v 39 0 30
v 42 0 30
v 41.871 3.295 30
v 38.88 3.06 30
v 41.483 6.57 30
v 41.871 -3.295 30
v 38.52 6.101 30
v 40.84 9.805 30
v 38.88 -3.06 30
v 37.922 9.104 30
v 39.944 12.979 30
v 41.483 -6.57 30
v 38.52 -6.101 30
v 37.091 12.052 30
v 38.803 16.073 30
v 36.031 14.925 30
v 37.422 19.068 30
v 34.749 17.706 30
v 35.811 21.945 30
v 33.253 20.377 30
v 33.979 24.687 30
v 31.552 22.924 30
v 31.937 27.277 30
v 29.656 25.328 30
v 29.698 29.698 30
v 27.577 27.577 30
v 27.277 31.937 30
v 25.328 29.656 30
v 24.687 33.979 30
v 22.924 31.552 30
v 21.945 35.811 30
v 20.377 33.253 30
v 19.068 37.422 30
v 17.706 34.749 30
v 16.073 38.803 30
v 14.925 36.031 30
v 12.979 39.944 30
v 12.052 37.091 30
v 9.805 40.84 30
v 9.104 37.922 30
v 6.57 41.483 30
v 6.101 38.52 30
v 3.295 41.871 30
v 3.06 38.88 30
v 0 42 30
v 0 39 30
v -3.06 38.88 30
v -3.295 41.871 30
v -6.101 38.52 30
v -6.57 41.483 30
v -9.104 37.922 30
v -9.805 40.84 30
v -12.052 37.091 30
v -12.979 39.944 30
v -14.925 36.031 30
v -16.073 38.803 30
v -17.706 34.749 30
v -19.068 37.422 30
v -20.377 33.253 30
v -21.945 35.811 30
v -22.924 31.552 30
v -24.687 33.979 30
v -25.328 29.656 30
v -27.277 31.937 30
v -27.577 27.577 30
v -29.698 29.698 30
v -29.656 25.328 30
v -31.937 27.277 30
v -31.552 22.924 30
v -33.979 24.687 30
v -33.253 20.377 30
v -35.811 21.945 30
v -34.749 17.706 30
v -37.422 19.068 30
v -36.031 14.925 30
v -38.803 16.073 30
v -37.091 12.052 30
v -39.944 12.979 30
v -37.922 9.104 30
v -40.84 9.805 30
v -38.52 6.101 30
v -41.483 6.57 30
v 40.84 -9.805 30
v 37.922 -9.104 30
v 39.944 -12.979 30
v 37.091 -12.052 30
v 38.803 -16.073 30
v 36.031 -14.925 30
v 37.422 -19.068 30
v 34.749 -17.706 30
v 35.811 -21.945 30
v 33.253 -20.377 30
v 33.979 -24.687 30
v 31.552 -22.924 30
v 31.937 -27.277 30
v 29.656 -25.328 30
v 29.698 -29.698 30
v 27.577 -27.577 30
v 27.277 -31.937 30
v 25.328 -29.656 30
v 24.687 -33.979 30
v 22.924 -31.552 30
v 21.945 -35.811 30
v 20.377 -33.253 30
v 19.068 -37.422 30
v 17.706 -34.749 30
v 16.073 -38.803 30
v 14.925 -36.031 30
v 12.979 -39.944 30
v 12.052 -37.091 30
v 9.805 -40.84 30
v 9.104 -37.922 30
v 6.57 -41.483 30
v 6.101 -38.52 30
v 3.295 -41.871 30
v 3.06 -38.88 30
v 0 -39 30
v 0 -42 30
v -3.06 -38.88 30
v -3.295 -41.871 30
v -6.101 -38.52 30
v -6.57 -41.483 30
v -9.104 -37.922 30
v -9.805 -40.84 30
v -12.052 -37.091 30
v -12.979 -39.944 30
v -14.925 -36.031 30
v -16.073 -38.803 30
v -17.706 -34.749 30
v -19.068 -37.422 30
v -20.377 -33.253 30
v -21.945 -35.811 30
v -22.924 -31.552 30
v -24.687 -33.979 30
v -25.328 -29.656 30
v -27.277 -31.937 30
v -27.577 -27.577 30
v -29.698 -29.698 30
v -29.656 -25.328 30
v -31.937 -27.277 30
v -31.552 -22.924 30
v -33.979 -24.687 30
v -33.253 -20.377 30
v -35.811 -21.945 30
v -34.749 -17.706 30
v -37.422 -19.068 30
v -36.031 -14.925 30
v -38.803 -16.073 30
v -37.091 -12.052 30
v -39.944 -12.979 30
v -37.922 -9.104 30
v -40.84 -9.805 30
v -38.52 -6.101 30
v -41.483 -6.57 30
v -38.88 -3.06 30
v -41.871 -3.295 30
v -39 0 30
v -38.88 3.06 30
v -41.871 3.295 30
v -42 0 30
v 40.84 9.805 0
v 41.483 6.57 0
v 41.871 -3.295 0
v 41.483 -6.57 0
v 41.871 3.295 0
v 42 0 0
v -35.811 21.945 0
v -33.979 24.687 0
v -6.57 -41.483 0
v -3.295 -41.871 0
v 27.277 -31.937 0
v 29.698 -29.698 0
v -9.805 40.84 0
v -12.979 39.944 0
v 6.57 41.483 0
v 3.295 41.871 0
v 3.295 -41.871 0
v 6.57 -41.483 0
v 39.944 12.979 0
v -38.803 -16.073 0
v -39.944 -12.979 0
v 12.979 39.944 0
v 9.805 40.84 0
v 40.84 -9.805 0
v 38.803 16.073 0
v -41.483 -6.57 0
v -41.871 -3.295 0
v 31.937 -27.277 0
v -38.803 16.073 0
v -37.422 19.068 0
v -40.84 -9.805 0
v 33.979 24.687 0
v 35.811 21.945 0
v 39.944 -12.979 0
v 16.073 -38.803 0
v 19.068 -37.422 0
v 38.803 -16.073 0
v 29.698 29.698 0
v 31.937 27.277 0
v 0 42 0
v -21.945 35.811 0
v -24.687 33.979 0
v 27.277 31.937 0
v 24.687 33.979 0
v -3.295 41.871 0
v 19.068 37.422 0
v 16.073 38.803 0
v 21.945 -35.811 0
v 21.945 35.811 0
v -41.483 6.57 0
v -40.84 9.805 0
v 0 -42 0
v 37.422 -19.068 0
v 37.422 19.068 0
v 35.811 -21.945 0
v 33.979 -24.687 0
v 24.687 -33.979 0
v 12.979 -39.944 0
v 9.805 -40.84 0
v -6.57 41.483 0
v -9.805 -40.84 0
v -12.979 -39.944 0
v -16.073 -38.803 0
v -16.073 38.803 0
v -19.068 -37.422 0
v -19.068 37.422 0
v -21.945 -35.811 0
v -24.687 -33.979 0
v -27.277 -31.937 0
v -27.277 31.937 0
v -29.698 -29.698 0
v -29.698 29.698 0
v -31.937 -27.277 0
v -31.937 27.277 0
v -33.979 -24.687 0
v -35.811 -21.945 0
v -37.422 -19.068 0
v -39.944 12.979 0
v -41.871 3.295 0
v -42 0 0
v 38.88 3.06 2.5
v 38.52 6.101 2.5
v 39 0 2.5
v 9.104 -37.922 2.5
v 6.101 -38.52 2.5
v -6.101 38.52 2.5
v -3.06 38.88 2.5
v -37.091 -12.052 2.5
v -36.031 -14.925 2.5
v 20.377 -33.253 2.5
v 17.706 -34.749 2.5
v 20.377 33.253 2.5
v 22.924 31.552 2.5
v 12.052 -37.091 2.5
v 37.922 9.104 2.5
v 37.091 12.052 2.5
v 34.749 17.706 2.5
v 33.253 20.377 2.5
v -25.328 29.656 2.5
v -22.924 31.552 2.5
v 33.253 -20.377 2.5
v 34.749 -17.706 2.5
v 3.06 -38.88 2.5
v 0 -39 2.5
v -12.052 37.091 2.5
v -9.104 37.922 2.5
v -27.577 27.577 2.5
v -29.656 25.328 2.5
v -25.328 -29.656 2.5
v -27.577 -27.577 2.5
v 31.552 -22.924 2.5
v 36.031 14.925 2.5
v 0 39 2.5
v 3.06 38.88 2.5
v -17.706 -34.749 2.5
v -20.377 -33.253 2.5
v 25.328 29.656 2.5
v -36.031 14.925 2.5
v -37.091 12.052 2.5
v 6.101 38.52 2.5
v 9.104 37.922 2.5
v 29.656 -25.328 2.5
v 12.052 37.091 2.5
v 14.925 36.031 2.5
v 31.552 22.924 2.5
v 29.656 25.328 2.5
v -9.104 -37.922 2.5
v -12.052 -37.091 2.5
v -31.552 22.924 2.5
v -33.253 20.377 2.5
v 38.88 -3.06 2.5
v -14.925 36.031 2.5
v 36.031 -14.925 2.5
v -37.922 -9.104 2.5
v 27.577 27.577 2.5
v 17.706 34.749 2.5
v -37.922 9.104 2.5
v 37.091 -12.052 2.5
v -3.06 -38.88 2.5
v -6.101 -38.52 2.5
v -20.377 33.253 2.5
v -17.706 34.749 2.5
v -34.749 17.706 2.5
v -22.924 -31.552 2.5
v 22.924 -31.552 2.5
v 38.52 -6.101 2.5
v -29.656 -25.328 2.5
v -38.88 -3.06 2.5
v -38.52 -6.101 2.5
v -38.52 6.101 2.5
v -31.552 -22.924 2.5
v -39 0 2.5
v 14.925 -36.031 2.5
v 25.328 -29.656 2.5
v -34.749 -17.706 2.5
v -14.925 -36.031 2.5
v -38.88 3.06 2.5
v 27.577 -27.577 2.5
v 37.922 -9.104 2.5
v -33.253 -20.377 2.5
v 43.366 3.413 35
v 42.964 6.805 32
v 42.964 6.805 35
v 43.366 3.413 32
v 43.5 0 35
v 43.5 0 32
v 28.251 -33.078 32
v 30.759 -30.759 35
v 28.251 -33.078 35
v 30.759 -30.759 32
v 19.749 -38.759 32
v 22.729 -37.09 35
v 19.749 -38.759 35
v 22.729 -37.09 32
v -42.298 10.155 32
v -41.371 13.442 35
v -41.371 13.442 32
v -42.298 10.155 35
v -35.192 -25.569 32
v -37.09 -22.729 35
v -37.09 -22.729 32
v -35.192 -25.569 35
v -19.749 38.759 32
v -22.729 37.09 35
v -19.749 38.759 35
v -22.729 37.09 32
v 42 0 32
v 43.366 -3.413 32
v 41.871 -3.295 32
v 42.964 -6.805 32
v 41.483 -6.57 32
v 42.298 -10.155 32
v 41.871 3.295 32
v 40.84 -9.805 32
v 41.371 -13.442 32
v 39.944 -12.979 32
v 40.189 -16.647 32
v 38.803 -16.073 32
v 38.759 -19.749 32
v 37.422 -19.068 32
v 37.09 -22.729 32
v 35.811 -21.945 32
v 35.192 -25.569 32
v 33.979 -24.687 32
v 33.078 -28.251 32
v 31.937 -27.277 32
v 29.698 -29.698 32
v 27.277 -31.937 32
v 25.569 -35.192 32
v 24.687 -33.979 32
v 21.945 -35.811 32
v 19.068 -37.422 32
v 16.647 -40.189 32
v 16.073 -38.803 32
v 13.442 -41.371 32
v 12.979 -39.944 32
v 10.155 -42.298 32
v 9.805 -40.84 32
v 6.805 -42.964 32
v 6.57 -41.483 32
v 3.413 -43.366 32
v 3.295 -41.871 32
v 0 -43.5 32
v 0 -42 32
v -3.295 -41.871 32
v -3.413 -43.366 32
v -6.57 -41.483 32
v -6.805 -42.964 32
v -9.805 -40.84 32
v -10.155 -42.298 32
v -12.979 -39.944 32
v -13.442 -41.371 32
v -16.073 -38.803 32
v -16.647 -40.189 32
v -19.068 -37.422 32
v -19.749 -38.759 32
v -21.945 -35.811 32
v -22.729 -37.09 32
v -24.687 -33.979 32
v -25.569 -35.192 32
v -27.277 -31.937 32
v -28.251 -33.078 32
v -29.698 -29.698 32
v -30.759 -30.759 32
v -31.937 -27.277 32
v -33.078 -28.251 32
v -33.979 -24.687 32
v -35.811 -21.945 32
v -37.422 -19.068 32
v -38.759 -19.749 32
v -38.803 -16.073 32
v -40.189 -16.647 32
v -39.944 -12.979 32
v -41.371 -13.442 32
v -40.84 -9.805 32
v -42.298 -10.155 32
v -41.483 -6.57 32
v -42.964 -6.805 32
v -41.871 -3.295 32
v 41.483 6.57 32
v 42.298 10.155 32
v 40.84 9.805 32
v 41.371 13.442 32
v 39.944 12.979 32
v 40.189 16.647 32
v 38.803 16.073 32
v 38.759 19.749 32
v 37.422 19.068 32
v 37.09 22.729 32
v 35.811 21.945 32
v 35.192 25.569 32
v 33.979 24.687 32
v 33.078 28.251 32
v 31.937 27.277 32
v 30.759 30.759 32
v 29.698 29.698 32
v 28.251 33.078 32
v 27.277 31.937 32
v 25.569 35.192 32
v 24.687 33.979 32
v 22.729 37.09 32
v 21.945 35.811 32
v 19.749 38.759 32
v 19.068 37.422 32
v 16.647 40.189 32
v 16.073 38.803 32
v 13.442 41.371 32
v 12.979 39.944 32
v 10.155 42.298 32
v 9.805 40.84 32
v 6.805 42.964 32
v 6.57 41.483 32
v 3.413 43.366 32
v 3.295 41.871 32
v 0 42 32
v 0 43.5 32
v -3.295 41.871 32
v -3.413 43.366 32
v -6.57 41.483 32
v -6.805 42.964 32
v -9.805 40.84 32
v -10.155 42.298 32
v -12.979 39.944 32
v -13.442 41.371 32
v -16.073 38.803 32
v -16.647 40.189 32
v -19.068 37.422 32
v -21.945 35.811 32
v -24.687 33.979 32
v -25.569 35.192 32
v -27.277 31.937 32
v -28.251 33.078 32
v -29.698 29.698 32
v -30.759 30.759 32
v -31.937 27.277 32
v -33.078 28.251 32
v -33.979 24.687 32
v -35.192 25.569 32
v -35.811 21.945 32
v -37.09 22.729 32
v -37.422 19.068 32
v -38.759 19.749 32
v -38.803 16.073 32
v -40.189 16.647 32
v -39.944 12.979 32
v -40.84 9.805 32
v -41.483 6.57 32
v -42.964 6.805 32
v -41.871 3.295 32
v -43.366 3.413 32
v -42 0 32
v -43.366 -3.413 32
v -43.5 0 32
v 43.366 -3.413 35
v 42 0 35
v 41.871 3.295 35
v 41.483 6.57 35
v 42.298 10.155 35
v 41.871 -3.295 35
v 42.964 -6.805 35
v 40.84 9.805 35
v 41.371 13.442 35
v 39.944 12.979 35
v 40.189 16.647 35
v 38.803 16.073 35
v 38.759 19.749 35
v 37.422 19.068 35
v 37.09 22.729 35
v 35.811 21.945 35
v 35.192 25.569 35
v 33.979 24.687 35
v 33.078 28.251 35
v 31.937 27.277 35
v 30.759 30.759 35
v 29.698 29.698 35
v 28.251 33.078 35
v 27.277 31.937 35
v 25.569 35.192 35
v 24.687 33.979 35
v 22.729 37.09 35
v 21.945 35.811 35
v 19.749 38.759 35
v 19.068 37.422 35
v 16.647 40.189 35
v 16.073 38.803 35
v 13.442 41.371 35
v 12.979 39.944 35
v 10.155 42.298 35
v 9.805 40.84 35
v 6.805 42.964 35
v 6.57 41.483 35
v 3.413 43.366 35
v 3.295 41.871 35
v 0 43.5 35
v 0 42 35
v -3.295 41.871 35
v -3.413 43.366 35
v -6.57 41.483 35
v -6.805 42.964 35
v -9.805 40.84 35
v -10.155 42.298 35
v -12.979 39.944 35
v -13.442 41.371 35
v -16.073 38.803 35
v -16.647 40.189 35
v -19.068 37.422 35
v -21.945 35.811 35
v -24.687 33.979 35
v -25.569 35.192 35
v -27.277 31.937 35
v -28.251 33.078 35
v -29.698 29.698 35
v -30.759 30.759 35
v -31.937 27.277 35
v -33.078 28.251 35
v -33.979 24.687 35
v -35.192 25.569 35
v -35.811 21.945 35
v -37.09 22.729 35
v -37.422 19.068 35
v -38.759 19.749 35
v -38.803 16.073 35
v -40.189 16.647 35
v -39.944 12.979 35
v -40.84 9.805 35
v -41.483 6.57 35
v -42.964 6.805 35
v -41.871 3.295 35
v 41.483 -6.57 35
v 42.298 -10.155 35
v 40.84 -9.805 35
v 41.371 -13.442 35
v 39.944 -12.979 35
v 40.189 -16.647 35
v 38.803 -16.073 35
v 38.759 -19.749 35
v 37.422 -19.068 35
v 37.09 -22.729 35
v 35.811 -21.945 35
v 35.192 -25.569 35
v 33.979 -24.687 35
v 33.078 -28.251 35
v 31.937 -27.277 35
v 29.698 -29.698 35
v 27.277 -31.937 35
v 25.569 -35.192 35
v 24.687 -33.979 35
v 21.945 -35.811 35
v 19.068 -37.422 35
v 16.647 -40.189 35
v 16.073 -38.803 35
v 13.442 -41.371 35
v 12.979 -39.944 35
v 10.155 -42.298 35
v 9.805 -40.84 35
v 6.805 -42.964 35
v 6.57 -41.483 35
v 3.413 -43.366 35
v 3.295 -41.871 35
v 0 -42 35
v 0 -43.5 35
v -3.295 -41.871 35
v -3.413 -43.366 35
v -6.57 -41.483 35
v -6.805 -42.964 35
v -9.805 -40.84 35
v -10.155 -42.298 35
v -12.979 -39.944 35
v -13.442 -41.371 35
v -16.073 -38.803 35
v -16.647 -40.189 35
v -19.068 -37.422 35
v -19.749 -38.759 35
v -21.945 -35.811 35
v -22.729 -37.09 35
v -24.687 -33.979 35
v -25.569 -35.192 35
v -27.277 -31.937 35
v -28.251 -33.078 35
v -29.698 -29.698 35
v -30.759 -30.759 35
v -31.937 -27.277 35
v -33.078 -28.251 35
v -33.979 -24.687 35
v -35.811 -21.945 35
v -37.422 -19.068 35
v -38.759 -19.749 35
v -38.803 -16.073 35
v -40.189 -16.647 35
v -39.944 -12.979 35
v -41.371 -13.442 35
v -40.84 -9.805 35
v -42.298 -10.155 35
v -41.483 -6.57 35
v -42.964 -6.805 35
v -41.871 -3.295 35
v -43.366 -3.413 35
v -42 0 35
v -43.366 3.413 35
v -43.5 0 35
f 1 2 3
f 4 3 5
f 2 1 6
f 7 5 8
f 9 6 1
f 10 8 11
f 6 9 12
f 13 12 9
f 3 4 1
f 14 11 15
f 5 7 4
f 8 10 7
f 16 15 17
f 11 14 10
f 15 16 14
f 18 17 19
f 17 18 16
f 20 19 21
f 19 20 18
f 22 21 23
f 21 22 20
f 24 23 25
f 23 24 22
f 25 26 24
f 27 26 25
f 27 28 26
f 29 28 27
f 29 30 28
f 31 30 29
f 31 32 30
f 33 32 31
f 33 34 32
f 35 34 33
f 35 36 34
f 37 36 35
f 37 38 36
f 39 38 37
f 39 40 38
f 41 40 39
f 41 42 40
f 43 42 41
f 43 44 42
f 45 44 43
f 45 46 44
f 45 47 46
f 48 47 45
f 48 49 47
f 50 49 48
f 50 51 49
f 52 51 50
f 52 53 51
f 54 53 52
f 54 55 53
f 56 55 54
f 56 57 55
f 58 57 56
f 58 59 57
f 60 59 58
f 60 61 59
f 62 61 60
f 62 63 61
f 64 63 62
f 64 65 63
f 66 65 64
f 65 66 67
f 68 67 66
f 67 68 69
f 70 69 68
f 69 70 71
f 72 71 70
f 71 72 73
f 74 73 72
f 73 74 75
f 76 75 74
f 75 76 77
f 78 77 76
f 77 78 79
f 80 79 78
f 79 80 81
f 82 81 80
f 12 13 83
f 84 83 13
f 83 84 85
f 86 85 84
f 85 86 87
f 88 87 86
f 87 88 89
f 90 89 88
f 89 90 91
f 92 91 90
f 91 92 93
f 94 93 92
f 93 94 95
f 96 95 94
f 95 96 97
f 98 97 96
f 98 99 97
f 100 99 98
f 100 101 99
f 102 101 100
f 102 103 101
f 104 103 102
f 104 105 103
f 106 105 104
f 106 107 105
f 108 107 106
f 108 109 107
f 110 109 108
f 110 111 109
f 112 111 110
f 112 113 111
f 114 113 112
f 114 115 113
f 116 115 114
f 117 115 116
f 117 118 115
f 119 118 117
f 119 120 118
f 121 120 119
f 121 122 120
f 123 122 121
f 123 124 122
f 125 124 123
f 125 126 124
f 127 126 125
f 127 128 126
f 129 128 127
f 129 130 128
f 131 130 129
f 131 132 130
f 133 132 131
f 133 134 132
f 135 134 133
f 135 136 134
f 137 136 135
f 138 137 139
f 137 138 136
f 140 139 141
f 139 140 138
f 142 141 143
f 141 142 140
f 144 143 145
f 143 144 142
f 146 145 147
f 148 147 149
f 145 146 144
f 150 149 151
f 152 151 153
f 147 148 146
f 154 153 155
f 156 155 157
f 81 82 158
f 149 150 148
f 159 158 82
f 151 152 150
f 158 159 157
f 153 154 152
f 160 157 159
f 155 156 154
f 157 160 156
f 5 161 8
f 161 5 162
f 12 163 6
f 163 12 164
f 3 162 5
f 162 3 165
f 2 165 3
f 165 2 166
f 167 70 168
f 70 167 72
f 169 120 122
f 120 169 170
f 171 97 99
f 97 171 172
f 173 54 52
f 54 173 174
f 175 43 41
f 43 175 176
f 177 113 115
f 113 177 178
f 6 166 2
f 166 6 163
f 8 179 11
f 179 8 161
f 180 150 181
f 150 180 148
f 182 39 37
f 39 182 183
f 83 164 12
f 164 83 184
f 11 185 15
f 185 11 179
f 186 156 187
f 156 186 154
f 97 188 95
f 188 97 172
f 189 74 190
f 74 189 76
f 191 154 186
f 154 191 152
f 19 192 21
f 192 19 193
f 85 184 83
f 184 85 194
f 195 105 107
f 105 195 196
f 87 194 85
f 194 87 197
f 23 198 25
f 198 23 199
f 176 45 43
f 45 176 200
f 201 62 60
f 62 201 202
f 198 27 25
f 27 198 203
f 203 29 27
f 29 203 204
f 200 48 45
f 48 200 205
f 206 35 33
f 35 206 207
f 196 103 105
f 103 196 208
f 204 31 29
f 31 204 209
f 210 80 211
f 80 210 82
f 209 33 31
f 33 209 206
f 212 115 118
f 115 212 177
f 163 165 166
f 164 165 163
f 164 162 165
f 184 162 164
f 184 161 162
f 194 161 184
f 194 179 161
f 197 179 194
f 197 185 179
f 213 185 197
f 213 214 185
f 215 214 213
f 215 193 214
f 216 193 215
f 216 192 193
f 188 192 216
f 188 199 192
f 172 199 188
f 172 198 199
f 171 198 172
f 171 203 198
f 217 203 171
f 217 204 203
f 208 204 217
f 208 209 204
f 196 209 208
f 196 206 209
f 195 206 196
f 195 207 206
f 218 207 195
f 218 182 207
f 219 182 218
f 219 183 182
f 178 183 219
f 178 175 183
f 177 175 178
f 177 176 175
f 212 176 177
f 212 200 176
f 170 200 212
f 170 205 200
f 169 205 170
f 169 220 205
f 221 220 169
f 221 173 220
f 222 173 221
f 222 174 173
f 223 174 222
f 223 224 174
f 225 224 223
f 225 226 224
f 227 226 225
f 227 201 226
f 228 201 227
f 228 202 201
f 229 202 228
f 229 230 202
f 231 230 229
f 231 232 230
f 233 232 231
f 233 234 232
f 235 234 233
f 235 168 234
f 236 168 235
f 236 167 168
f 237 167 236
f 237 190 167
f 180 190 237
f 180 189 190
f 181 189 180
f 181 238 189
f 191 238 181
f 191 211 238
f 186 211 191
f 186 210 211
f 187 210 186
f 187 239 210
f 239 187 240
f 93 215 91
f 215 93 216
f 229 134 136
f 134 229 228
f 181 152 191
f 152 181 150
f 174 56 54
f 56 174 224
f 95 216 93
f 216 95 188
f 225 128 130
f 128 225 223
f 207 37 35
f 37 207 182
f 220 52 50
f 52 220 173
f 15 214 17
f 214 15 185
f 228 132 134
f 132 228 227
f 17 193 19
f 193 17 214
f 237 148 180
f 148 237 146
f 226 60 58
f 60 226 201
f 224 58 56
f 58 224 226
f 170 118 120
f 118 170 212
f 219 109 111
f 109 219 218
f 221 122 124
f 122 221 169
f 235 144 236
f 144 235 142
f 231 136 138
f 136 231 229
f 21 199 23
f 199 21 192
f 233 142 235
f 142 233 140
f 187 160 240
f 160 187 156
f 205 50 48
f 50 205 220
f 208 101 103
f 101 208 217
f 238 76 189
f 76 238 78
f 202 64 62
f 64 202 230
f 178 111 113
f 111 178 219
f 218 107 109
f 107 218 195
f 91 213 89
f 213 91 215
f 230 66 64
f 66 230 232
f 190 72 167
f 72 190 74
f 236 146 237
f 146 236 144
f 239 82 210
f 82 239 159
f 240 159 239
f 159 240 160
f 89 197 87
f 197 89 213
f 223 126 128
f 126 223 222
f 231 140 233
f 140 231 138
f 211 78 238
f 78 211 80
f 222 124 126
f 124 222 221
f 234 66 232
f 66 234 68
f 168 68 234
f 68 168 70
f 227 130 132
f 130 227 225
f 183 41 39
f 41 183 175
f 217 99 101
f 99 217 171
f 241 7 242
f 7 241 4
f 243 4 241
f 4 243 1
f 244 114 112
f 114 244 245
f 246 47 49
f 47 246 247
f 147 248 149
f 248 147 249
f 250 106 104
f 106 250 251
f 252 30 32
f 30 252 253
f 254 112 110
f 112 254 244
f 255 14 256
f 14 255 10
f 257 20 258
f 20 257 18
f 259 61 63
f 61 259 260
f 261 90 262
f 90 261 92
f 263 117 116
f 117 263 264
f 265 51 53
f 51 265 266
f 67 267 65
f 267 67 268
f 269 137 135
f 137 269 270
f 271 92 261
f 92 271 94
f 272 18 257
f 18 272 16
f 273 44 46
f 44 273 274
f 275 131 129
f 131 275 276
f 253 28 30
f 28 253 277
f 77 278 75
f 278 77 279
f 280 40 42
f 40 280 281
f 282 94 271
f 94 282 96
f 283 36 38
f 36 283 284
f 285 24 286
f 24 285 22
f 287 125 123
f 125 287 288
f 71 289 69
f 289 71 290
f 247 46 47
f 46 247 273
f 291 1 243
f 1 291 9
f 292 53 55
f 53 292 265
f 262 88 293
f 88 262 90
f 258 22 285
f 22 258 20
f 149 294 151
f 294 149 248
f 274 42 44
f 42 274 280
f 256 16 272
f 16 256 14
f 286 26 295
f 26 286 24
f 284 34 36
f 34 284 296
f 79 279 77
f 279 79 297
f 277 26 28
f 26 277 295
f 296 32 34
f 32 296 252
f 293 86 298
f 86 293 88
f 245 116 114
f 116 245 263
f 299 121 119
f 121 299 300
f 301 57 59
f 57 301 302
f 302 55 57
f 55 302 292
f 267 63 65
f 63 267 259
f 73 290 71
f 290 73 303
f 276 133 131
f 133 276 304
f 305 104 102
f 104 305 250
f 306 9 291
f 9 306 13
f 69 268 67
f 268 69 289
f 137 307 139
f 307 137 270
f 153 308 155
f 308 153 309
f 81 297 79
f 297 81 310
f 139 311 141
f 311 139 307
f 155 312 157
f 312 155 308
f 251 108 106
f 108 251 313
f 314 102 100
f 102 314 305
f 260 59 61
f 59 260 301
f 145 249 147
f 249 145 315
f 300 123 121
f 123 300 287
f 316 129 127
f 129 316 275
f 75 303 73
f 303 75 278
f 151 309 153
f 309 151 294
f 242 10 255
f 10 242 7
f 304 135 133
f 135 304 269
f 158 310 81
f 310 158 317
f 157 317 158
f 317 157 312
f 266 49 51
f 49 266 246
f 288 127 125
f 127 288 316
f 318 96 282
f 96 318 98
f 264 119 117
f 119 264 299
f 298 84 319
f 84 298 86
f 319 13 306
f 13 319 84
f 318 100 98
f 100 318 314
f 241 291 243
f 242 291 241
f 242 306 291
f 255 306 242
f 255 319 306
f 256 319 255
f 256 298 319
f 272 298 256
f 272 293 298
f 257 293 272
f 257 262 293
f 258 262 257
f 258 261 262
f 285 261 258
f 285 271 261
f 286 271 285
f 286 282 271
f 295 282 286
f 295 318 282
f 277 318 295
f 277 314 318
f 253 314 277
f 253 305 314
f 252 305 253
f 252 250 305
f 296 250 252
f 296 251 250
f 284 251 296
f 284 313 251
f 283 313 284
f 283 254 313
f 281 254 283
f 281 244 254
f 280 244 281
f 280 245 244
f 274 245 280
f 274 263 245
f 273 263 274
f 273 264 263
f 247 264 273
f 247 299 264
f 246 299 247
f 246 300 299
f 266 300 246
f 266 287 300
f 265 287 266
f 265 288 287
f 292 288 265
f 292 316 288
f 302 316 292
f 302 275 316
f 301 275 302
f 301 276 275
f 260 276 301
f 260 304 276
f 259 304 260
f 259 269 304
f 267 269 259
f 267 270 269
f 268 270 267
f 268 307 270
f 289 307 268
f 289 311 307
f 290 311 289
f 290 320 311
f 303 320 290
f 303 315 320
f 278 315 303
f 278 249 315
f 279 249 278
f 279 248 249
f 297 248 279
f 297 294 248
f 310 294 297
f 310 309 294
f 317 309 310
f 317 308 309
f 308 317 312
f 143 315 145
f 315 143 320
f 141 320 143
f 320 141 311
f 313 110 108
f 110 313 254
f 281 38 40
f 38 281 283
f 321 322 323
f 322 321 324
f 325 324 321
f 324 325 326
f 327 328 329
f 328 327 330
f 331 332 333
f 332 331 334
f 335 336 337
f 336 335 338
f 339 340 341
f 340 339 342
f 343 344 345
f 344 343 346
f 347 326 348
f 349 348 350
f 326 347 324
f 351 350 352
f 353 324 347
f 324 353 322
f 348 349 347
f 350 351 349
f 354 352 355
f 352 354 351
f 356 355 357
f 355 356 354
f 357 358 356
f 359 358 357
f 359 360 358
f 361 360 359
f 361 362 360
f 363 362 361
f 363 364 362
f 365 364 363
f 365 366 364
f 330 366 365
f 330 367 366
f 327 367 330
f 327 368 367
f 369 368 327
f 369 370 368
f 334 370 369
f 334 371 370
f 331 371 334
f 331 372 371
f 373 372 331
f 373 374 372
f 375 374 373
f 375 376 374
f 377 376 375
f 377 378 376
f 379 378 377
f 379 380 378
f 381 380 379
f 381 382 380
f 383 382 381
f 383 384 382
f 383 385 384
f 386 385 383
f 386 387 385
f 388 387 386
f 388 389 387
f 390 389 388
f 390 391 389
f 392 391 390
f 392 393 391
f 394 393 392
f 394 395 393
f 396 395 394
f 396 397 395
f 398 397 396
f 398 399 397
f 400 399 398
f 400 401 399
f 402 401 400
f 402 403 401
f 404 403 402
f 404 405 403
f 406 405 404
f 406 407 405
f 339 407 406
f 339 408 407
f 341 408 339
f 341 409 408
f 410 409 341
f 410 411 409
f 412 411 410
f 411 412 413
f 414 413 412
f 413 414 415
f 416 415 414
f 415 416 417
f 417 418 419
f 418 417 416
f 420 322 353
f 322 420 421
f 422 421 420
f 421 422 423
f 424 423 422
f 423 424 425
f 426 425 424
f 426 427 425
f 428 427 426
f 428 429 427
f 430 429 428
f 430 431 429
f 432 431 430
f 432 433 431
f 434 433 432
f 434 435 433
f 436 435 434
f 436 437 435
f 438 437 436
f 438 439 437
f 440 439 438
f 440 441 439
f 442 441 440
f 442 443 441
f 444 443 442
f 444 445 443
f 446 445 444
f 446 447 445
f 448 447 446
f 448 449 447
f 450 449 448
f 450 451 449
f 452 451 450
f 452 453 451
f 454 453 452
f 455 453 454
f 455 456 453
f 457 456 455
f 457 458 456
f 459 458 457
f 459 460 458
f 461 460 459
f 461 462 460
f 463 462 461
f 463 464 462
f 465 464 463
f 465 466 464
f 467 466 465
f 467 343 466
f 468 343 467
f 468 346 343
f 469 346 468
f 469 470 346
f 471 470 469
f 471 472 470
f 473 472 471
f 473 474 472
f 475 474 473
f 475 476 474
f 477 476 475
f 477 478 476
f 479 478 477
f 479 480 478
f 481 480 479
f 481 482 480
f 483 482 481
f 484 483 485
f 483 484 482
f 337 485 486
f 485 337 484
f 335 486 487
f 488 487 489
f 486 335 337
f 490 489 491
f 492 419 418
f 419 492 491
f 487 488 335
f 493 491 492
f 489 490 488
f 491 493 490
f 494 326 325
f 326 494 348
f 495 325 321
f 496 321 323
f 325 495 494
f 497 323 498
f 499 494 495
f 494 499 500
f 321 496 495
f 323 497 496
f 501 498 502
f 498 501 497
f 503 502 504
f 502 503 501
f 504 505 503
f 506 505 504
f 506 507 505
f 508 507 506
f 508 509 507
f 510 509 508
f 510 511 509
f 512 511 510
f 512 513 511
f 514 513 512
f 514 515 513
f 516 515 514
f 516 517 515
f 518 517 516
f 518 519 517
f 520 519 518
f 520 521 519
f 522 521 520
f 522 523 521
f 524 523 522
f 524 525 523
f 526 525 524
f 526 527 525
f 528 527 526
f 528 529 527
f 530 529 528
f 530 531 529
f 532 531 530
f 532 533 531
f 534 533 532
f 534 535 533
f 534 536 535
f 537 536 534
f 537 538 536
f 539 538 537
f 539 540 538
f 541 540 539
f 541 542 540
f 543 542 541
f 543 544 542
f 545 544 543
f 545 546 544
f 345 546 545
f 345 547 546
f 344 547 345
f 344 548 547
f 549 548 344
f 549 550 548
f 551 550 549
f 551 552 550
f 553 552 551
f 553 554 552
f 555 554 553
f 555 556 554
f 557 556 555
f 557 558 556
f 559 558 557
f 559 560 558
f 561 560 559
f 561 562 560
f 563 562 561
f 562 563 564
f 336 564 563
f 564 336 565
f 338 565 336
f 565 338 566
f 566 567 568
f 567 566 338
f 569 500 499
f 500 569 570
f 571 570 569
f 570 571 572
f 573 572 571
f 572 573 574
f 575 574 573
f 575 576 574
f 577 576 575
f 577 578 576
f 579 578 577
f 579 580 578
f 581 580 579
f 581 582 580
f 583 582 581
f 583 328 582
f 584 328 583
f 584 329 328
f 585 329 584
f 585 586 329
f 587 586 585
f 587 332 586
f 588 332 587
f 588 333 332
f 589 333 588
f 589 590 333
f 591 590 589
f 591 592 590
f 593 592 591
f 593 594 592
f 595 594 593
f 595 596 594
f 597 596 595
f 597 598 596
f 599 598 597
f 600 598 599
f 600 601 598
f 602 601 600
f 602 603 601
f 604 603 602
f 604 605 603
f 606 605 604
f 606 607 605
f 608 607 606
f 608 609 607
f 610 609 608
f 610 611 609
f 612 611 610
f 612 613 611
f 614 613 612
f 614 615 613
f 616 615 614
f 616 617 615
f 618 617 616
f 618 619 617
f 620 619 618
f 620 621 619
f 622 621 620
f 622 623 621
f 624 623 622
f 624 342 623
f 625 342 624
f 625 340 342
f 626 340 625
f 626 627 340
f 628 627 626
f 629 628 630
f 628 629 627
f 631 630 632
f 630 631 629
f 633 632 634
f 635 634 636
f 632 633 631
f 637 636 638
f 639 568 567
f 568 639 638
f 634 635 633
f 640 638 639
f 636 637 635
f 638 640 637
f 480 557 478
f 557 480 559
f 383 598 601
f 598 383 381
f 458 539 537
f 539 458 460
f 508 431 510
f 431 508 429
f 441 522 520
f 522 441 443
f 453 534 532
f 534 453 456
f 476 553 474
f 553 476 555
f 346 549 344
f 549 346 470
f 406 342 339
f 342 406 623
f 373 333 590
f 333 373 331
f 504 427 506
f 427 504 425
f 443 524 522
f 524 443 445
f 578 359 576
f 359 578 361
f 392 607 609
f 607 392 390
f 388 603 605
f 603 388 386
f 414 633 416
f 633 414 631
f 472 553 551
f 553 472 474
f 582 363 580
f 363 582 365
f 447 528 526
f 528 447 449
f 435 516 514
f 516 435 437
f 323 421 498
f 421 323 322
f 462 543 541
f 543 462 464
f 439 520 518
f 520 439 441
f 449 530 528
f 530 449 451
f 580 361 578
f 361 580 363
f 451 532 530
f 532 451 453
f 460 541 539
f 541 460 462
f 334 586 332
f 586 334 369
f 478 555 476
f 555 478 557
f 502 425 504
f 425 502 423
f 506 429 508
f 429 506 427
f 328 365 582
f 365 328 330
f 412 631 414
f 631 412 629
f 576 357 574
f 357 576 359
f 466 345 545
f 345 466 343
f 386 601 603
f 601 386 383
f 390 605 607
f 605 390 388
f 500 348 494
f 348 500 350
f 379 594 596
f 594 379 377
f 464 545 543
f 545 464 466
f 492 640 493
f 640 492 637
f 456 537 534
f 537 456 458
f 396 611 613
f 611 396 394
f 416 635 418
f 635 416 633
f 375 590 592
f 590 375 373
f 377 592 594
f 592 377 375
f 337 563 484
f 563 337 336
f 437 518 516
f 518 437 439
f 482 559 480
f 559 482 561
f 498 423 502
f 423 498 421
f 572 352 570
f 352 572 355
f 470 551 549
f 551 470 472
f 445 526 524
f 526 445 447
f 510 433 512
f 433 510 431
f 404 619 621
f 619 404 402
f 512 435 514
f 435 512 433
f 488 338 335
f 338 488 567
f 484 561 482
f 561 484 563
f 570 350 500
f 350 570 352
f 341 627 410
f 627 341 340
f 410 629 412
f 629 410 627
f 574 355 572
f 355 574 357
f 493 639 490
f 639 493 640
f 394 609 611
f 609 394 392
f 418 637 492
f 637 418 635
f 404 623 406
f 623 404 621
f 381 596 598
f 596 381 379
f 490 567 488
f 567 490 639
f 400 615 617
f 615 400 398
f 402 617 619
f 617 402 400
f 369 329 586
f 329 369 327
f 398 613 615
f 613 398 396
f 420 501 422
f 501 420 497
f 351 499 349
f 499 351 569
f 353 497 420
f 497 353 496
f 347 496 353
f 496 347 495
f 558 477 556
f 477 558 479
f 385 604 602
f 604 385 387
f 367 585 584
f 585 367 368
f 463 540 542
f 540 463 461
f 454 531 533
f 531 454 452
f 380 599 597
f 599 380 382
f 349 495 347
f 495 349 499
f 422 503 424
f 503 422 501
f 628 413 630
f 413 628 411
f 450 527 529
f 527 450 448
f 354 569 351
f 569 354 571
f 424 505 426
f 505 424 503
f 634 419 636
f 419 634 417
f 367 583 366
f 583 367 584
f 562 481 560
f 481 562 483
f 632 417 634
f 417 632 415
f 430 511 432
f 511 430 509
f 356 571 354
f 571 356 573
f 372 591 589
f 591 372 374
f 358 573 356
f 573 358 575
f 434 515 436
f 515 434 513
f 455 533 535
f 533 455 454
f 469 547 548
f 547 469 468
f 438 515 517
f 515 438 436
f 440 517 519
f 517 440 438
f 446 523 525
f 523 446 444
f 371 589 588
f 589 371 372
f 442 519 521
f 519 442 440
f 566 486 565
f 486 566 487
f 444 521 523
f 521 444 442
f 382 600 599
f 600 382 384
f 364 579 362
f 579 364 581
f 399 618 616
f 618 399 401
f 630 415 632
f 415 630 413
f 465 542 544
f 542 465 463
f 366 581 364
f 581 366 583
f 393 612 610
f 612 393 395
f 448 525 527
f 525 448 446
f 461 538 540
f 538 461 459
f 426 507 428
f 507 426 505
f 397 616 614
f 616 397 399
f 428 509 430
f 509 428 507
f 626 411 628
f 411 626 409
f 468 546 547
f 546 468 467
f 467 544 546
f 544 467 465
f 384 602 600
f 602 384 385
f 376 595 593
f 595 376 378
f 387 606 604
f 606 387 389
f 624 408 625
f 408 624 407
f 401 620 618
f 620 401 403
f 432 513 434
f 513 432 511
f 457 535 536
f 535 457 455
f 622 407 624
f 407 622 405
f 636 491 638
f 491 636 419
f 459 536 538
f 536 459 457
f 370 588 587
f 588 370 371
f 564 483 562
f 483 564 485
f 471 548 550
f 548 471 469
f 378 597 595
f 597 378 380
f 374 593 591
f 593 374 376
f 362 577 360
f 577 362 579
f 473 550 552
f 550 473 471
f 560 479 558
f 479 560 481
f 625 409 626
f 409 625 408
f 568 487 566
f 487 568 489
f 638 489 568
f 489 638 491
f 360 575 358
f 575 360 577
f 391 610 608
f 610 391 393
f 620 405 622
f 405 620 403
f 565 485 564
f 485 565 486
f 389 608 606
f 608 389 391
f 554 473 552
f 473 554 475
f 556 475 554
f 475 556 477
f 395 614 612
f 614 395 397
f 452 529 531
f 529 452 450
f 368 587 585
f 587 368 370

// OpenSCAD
// ============================================================
// Orb V2 — 中壳（PCB + LED 腔体）
// PLA+ 打印，不透光
// ============================================================

// --- 参数 ---
outer_r       = 42;      // 中壳外径（略小于上壳内径，用于嵌套）
inner_r       = 39;      // 内径
height        = 35;      // 中壳总高度
wall_thick    = 2.5;

module shell_mid() {
    difference() {
        // 外壁
        cylinder(h = height, r = outer_r, $fn = 80);

        // 内腔
        translate([0, 0, wall_thick])
            cylinder(h = height, r = inner_r, $fn = 80);

        // LED 光窗（上部环形开口，让光透到上壳）
        translate([0, 0, height - 5])
            difference() {
                cylinder(h = 6, r = outer_r + 1, $fn = 80);
                cylinder(h = 6, r = 25, $fn = 80);
            }
    }

    // 上部卡扣槽（接收上壳凸缘）
    difference() {
        translate([0, 0, height - 3])
            cylinder(h = 3, r = outer_r + 1.5, $fn = 80);
        translate([0, 0, height - 3.1])
            cylinder(h = 3.2, r = outer_r, $fn = 80);
    }
}

shell_mid();
